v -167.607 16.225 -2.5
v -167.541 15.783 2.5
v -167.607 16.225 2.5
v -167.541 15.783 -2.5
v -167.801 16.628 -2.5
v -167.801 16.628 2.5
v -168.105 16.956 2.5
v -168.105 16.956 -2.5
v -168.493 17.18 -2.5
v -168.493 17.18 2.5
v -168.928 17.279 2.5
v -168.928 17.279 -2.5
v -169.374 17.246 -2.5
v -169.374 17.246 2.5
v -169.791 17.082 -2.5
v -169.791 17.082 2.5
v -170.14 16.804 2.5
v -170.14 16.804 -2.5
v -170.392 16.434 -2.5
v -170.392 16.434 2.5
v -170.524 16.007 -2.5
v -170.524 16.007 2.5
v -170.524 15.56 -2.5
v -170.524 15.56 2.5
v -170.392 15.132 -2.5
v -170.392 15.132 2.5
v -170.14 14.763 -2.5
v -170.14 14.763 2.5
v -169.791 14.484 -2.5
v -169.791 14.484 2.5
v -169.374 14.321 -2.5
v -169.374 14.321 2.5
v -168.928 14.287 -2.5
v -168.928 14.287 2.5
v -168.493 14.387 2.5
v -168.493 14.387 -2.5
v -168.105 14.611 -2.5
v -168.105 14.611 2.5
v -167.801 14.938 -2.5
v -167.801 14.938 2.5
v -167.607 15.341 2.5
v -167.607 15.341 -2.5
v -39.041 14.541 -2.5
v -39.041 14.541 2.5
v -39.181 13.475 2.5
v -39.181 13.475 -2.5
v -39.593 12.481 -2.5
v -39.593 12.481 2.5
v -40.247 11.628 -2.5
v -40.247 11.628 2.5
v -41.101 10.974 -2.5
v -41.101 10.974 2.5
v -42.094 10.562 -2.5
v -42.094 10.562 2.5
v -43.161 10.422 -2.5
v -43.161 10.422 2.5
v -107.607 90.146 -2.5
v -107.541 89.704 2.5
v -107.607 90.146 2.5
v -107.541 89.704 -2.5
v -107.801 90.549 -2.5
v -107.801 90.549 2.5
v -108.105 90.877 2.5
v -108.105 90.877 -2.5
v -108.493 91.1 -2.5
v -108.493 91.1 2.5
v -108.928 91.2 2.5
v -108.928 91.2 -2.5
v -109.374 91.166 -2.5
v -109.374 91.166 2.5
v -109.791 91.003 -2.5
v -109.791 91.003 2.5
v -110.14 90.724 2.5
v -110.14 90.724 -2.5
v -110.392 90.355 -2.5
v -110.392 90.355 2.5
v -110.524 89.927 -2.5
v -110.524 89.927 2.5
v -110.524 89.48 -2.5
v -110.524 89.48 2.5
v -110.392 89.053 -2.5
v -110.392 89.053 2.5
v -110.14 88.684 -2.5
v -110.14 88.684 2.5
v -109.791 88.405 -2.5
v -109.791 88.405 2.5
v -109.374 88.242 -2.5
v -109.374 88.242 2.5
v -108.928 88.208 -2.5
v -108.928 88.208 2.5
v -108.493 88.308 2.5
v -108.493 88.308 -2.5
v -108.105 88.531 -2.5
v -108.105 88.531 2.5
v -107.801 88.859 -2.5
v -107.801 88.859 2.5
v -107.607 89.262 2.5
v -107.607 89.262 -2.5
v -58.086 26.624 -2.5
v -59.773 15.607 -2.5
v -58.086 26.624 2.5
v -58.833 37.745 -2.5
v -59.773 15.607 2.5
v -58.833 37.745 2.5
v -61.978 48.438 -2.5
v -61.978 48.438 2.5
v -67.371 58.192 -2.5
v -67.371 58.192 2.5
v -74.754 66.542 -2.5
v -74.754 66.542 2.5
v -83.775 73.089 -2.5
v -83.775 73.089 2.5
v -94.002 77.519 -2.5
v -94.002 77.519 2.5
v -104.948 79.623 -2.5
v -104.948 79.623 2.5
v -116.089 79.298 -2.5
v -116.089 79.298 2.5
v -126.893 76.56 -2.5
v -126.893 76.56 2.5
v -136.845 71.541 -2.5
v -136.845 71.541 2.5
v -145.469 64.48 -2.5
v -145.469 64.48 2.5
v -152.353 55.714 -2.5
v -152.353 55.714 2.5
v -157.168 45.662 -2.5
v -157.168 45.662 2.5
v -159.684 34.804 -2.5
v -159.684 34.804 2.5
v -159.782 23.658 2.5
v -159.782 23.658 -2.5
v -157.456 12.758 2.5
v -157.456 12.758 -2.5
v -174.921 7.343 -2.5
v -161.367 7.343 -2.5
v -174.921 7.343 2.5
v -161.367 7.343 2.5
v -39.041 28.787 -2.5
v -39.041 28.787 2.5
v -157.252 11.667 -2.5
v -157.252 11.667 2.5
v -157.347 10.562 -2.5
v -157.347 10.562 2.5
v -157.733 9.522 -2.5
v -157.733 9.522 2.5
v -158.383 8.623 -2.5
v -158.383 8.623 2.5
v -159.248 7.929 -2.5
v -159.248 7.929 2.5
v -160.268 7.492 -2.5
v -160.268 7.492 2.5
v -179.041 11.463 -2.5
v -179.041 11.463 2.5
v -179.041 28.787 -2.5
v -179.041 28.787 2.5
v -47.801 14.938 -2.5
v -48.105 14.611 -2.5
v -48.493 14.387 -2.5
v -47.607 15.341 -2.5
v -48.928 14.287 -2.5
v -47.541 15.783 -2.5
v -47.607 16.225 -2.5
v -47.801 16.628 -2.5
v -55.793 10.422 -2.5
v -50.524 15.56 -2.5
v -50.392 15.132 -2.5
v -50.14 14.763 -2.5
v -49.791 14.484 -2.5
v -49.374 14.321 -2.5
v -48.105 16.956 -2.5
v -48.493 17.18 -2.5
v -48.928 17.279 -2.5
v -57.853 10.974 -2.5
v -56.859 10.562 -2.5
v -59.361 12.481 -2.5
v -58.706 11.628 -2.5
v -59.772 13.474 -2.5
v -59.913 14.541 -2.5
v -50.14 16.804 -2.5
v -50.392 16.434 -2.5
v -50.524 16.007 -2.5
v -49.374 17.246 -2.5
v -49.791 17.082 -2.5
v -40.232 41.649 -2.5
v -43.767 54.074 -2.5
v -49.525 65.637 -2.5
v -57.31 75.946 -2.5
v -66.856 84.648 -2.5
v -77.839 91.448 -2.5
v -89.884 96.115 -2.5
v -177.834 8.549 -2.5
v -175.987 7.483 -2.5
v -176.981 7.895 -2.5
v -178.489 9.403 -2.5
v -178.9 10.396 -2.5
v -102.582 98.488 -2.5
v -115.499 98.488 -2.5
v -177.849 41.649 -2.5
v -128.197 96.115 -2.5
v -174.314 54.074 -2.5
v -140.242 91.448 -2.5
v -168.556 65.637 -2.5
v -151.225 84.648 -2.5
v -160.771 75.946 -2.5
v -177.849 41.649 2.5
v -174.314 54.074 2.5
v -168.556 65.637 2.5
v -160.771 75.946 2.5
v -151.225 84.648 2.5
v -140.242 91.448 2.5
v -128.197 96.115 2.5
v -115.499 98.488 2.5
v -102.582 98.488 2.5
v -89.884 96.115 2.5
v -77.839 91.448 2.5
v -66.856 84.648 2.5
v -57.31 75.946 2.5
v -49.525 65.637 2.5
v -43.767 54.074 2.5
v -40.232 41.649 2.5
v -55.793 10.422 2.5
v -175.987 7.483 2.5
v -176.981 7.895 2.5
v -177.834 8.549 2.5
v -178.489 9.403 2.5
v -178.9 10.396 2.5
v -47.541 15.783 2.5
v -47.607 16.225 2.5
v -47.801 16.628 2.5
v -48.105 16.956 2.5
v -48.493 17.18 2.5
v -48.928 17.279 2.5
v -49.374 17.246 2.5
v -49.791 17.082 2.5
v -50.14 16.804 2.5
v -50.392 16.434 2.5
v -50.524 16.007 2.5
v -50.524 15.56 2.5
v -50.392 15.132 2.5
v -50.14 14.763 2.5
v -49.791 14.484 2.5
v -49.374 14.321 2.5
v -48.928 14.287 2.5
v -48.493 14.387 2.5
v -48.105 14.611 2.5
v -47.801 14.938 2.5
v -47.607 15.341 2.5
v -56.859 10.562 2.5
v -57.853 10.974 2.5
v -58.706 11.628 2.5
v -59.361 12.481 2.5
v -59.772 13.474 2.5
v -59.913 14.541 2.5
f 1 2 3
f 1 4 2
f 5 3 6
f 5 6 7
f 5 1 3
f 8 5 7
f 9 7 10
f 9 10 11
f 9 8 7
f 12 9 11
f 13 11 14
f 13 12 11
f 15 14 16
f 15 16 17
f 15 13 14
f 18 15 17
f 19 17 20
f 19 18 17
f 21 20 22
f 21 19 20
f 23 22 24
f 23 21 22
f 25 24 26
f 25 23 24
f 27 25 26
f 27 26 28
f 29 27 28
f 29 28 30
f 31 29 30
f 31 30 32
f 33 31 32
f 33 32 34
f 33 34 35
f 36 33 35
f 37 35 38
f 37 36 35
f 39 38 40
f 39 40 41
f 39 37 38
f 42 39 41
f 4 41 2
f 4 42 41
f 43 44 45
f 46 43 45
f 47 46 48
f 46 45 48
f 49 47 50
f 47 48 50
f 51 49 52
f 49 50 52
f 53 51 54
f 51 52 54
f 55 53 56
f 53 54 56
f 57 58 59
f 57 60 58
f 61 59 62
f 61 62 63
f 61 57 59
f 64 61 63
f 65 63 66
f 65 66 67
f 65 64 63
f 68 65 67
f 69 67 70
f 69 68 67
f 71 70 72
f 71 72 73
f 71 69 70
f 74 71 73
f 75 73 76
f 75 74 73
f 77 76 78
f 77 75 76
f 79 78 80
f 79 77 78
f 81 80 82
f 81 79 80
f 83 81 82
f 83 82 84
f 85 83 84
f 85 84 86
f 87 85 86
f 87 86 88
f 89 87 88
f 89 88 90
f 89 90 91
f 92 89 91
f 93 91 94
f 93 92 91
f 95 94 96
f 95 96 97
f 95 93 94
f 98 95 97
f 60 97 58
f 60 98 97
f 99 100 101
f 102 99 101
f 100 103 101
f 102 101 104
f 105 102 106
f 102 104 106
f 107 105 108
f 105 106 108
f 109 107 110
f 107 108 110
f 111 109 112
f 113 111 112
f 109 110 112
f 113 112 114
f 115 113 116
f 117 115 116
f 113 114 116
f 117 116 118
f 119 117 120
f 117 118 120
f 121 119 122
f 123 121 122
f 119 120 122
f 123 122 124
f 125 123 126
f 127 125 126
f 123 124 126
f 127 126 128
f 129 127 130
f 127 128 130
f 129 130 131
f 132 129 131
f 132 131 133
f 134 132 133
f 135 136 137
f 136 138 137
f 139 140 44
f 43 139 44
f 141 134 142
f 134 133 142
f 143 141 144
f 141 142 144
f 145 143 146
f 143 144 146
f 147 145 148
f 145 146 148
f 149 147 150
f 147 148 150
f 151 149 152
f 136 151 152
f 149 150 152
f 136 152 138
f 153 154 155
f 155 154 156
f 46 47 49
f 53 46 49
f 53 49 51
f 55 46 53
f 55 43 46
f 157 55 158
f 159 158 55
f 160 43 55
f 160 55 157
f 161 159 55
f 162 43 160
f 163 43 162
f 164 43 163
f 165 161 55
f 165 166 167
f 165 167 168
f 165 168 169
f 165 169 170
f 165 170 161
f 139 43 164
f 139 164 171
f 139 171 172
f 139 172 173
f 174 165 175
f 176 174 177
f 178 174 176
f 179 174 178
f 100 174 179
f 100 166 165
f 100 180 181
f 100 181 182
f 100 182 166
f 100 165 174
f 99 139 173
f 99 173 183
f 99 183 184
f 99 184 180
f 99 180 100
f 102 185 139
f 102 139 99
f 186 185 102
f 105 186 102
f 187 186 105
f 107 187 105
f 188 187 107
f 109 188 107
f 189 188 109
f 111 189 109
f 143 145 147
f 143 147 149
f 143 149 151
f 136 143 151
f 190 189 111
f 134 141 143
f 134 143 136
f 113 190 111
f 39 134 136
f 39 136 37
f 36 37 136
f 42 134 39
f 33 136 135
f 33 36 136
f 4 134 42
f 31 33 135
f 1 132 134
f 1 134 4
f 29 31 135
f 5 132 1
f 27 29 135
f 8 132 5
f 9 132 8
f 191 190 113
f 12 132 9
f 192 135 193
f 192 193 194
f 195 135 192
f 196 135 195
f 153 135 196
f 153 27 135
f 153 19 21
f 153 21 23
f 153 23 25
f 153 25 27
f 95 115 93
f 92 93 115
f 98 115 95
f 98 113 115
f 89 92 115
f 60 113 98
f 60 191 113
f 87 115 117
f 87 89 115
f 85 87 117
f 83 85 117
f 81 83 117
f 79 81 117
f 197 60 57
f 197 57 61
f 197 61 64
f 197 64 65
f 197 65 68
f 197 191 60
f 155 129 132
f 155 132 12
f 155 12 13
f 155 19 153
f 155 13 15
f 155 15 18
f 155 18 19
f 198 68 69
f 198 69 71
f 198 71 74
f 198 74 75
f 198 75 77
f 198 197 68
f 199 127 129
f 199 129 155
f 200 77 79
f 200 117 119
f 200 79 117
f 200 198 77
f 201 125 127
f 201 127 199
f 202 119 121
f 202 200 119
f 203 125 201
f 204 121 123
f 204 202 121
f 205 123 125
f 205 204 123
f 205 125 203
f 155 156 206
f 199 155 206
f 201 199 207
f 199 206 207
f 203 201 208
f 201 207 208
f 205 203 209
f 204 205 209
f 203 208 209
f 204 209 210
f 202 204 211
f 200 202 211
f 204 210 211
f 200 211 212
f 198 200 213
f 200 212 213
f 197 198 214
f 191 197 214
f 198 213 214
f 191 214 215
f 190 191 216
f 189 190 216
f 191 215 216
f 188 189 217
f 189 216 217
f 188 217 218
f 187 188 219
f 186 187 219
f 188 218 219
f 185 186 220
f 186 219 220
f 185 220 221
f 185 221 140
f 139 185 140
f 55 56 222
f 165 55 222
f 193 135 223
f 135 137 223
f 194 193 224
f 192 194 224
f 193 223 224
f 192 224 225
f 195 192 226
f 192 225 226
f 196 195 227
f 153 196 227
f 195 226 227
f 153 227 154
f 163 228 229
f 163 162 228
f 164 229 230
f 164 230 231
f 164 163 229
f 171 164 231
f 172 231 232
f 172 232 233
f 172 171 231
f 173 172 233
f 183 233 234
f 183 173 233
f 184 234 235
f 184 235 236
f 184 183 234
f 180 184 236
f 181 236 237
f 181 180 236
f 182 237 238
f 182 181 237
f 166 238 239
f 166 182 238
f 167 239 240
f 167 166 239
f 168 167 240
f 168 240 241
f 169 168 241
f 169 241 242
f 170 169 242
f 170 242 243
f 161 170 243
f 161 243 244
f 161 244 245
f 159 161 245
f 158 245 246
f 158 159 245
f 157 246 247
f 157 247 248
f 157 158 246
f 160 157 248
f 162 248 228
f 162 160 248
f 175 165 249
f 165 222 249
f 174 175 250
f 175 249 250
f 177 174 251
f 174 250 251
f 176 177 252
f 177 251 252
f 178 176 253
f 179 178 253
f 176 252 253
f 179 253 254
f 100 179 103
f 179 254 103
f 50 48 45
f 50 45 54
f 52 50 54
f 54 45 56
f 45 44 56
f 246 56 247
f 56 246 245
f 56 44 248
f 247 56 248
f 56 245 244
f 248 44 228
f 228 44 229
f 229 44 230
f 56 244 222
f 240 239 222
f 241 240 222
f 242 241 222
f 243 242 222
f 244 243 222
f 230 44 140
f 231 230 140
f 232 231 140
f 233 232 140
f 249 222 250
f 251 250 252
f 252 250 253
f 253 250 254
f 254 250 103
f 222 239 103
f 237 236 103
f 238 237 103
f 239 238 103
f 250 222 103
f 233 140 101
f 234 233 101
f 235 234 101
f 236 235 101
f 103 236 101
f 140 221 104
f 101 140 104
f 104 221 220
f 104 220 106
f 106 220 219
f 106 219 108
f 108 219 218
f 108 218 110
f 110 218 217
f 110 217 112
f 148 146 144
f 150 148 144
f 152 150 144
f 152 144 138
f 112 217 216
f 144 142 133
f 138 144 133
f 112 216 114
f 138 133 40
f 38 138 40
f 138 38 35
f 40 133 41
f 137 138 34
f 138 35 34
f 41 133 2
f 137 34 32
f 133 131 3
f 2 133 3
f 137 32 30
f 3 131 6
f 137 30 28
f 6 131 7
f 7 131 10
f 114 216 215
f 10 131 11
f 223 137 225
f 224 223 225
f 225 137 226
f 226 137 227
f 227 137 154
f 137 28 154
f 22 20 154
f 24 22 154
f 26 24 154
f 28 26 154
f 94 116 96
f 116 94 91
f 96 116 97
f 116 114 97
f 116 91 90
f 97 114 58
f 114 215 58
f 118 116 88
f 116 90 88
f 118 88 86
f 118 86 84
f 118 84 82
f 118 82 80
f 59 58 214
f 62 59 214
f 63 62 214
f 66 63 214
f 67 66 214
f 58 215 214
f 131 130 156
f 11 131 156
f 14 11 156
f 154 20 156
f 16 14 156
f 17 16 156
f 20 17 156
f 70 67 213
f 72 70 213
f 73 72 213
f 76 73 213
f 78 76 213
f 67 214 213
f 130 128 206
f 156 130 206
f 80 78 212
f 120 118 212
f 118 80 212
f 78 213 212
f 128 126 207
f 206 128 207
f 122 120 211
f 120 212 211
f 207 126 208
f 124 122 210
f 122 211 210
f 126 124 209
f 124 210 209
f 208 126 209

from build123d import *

# Parameters (mm, degrees)
SKETCH1_R                   = 1.5
Y_KSEKLIK_EKSTR_ZYON1_DEPTH = 2.5


with BuildPart() as part:
    # Sketch1 → Yükseklik-Ekstrüzyon1 (new, symmetric)
    with BuildSketch(Plane.XY):
        with BuildLine():
            Line((-43.160520199, 10.421906731), (-55.793069396, 10.421906731))
            ThreePointArc((-55.793069396, 10.421906731), (-59.061190769, 12.033165476), (-59.773103822, 15.606672417))
            ThreePointArc((-59.773103822, 15.606672417), (-110.527372239, 79.765345936), (-157.455994445, 12.757618261))
            ThreePointArc((-157.455994445, 12.757618261), (-158.027333354, 9.050297499), (-161.3672053, 7.34269369))
            Line((-161.3672053, 7.34269369), (-174.920520263, 7.34269369))
            ThreePointArc((-174.920520263, 7.34269369), (-177.833800201, 8.549413752), (-179.040520263, 11.46269369))
            Line((-179.040520263, 11.46269369), (-179.040520263, 28.787024355))
            ThreePointArc((-179.040520263, 28.787024355), (-109.040520263, 98.787024355), (-39.040520263, 28.787024355))
            Line((-39.040520263, 28.787024355), (-39.040520263, 14.54118218))
            ThreePointArc((-39.040520263, 14.54118218), (-40.247496439, 11.628370637), (-43.160520199, 10.421906731))
        make_face()
        with Locations((-169.040520263, 15.783267045)):
            Circle(SKETCH1_R, mode=Mode.SUBTRACT)
        with Locations((-49.040520263, 15.783267045)):
            Circle(SKETCH1_R, mode=Mode.SUBTRACT)
        with Locations((-109.040520263, 89.703931552)):
            Circle(SKETCH1_R, mode=Mode.SUBTRACT)
    extrude(amount=Y_KSEKLIK_EKSTR_ZYON1_DEPTH, both=True)


solid = part.part
